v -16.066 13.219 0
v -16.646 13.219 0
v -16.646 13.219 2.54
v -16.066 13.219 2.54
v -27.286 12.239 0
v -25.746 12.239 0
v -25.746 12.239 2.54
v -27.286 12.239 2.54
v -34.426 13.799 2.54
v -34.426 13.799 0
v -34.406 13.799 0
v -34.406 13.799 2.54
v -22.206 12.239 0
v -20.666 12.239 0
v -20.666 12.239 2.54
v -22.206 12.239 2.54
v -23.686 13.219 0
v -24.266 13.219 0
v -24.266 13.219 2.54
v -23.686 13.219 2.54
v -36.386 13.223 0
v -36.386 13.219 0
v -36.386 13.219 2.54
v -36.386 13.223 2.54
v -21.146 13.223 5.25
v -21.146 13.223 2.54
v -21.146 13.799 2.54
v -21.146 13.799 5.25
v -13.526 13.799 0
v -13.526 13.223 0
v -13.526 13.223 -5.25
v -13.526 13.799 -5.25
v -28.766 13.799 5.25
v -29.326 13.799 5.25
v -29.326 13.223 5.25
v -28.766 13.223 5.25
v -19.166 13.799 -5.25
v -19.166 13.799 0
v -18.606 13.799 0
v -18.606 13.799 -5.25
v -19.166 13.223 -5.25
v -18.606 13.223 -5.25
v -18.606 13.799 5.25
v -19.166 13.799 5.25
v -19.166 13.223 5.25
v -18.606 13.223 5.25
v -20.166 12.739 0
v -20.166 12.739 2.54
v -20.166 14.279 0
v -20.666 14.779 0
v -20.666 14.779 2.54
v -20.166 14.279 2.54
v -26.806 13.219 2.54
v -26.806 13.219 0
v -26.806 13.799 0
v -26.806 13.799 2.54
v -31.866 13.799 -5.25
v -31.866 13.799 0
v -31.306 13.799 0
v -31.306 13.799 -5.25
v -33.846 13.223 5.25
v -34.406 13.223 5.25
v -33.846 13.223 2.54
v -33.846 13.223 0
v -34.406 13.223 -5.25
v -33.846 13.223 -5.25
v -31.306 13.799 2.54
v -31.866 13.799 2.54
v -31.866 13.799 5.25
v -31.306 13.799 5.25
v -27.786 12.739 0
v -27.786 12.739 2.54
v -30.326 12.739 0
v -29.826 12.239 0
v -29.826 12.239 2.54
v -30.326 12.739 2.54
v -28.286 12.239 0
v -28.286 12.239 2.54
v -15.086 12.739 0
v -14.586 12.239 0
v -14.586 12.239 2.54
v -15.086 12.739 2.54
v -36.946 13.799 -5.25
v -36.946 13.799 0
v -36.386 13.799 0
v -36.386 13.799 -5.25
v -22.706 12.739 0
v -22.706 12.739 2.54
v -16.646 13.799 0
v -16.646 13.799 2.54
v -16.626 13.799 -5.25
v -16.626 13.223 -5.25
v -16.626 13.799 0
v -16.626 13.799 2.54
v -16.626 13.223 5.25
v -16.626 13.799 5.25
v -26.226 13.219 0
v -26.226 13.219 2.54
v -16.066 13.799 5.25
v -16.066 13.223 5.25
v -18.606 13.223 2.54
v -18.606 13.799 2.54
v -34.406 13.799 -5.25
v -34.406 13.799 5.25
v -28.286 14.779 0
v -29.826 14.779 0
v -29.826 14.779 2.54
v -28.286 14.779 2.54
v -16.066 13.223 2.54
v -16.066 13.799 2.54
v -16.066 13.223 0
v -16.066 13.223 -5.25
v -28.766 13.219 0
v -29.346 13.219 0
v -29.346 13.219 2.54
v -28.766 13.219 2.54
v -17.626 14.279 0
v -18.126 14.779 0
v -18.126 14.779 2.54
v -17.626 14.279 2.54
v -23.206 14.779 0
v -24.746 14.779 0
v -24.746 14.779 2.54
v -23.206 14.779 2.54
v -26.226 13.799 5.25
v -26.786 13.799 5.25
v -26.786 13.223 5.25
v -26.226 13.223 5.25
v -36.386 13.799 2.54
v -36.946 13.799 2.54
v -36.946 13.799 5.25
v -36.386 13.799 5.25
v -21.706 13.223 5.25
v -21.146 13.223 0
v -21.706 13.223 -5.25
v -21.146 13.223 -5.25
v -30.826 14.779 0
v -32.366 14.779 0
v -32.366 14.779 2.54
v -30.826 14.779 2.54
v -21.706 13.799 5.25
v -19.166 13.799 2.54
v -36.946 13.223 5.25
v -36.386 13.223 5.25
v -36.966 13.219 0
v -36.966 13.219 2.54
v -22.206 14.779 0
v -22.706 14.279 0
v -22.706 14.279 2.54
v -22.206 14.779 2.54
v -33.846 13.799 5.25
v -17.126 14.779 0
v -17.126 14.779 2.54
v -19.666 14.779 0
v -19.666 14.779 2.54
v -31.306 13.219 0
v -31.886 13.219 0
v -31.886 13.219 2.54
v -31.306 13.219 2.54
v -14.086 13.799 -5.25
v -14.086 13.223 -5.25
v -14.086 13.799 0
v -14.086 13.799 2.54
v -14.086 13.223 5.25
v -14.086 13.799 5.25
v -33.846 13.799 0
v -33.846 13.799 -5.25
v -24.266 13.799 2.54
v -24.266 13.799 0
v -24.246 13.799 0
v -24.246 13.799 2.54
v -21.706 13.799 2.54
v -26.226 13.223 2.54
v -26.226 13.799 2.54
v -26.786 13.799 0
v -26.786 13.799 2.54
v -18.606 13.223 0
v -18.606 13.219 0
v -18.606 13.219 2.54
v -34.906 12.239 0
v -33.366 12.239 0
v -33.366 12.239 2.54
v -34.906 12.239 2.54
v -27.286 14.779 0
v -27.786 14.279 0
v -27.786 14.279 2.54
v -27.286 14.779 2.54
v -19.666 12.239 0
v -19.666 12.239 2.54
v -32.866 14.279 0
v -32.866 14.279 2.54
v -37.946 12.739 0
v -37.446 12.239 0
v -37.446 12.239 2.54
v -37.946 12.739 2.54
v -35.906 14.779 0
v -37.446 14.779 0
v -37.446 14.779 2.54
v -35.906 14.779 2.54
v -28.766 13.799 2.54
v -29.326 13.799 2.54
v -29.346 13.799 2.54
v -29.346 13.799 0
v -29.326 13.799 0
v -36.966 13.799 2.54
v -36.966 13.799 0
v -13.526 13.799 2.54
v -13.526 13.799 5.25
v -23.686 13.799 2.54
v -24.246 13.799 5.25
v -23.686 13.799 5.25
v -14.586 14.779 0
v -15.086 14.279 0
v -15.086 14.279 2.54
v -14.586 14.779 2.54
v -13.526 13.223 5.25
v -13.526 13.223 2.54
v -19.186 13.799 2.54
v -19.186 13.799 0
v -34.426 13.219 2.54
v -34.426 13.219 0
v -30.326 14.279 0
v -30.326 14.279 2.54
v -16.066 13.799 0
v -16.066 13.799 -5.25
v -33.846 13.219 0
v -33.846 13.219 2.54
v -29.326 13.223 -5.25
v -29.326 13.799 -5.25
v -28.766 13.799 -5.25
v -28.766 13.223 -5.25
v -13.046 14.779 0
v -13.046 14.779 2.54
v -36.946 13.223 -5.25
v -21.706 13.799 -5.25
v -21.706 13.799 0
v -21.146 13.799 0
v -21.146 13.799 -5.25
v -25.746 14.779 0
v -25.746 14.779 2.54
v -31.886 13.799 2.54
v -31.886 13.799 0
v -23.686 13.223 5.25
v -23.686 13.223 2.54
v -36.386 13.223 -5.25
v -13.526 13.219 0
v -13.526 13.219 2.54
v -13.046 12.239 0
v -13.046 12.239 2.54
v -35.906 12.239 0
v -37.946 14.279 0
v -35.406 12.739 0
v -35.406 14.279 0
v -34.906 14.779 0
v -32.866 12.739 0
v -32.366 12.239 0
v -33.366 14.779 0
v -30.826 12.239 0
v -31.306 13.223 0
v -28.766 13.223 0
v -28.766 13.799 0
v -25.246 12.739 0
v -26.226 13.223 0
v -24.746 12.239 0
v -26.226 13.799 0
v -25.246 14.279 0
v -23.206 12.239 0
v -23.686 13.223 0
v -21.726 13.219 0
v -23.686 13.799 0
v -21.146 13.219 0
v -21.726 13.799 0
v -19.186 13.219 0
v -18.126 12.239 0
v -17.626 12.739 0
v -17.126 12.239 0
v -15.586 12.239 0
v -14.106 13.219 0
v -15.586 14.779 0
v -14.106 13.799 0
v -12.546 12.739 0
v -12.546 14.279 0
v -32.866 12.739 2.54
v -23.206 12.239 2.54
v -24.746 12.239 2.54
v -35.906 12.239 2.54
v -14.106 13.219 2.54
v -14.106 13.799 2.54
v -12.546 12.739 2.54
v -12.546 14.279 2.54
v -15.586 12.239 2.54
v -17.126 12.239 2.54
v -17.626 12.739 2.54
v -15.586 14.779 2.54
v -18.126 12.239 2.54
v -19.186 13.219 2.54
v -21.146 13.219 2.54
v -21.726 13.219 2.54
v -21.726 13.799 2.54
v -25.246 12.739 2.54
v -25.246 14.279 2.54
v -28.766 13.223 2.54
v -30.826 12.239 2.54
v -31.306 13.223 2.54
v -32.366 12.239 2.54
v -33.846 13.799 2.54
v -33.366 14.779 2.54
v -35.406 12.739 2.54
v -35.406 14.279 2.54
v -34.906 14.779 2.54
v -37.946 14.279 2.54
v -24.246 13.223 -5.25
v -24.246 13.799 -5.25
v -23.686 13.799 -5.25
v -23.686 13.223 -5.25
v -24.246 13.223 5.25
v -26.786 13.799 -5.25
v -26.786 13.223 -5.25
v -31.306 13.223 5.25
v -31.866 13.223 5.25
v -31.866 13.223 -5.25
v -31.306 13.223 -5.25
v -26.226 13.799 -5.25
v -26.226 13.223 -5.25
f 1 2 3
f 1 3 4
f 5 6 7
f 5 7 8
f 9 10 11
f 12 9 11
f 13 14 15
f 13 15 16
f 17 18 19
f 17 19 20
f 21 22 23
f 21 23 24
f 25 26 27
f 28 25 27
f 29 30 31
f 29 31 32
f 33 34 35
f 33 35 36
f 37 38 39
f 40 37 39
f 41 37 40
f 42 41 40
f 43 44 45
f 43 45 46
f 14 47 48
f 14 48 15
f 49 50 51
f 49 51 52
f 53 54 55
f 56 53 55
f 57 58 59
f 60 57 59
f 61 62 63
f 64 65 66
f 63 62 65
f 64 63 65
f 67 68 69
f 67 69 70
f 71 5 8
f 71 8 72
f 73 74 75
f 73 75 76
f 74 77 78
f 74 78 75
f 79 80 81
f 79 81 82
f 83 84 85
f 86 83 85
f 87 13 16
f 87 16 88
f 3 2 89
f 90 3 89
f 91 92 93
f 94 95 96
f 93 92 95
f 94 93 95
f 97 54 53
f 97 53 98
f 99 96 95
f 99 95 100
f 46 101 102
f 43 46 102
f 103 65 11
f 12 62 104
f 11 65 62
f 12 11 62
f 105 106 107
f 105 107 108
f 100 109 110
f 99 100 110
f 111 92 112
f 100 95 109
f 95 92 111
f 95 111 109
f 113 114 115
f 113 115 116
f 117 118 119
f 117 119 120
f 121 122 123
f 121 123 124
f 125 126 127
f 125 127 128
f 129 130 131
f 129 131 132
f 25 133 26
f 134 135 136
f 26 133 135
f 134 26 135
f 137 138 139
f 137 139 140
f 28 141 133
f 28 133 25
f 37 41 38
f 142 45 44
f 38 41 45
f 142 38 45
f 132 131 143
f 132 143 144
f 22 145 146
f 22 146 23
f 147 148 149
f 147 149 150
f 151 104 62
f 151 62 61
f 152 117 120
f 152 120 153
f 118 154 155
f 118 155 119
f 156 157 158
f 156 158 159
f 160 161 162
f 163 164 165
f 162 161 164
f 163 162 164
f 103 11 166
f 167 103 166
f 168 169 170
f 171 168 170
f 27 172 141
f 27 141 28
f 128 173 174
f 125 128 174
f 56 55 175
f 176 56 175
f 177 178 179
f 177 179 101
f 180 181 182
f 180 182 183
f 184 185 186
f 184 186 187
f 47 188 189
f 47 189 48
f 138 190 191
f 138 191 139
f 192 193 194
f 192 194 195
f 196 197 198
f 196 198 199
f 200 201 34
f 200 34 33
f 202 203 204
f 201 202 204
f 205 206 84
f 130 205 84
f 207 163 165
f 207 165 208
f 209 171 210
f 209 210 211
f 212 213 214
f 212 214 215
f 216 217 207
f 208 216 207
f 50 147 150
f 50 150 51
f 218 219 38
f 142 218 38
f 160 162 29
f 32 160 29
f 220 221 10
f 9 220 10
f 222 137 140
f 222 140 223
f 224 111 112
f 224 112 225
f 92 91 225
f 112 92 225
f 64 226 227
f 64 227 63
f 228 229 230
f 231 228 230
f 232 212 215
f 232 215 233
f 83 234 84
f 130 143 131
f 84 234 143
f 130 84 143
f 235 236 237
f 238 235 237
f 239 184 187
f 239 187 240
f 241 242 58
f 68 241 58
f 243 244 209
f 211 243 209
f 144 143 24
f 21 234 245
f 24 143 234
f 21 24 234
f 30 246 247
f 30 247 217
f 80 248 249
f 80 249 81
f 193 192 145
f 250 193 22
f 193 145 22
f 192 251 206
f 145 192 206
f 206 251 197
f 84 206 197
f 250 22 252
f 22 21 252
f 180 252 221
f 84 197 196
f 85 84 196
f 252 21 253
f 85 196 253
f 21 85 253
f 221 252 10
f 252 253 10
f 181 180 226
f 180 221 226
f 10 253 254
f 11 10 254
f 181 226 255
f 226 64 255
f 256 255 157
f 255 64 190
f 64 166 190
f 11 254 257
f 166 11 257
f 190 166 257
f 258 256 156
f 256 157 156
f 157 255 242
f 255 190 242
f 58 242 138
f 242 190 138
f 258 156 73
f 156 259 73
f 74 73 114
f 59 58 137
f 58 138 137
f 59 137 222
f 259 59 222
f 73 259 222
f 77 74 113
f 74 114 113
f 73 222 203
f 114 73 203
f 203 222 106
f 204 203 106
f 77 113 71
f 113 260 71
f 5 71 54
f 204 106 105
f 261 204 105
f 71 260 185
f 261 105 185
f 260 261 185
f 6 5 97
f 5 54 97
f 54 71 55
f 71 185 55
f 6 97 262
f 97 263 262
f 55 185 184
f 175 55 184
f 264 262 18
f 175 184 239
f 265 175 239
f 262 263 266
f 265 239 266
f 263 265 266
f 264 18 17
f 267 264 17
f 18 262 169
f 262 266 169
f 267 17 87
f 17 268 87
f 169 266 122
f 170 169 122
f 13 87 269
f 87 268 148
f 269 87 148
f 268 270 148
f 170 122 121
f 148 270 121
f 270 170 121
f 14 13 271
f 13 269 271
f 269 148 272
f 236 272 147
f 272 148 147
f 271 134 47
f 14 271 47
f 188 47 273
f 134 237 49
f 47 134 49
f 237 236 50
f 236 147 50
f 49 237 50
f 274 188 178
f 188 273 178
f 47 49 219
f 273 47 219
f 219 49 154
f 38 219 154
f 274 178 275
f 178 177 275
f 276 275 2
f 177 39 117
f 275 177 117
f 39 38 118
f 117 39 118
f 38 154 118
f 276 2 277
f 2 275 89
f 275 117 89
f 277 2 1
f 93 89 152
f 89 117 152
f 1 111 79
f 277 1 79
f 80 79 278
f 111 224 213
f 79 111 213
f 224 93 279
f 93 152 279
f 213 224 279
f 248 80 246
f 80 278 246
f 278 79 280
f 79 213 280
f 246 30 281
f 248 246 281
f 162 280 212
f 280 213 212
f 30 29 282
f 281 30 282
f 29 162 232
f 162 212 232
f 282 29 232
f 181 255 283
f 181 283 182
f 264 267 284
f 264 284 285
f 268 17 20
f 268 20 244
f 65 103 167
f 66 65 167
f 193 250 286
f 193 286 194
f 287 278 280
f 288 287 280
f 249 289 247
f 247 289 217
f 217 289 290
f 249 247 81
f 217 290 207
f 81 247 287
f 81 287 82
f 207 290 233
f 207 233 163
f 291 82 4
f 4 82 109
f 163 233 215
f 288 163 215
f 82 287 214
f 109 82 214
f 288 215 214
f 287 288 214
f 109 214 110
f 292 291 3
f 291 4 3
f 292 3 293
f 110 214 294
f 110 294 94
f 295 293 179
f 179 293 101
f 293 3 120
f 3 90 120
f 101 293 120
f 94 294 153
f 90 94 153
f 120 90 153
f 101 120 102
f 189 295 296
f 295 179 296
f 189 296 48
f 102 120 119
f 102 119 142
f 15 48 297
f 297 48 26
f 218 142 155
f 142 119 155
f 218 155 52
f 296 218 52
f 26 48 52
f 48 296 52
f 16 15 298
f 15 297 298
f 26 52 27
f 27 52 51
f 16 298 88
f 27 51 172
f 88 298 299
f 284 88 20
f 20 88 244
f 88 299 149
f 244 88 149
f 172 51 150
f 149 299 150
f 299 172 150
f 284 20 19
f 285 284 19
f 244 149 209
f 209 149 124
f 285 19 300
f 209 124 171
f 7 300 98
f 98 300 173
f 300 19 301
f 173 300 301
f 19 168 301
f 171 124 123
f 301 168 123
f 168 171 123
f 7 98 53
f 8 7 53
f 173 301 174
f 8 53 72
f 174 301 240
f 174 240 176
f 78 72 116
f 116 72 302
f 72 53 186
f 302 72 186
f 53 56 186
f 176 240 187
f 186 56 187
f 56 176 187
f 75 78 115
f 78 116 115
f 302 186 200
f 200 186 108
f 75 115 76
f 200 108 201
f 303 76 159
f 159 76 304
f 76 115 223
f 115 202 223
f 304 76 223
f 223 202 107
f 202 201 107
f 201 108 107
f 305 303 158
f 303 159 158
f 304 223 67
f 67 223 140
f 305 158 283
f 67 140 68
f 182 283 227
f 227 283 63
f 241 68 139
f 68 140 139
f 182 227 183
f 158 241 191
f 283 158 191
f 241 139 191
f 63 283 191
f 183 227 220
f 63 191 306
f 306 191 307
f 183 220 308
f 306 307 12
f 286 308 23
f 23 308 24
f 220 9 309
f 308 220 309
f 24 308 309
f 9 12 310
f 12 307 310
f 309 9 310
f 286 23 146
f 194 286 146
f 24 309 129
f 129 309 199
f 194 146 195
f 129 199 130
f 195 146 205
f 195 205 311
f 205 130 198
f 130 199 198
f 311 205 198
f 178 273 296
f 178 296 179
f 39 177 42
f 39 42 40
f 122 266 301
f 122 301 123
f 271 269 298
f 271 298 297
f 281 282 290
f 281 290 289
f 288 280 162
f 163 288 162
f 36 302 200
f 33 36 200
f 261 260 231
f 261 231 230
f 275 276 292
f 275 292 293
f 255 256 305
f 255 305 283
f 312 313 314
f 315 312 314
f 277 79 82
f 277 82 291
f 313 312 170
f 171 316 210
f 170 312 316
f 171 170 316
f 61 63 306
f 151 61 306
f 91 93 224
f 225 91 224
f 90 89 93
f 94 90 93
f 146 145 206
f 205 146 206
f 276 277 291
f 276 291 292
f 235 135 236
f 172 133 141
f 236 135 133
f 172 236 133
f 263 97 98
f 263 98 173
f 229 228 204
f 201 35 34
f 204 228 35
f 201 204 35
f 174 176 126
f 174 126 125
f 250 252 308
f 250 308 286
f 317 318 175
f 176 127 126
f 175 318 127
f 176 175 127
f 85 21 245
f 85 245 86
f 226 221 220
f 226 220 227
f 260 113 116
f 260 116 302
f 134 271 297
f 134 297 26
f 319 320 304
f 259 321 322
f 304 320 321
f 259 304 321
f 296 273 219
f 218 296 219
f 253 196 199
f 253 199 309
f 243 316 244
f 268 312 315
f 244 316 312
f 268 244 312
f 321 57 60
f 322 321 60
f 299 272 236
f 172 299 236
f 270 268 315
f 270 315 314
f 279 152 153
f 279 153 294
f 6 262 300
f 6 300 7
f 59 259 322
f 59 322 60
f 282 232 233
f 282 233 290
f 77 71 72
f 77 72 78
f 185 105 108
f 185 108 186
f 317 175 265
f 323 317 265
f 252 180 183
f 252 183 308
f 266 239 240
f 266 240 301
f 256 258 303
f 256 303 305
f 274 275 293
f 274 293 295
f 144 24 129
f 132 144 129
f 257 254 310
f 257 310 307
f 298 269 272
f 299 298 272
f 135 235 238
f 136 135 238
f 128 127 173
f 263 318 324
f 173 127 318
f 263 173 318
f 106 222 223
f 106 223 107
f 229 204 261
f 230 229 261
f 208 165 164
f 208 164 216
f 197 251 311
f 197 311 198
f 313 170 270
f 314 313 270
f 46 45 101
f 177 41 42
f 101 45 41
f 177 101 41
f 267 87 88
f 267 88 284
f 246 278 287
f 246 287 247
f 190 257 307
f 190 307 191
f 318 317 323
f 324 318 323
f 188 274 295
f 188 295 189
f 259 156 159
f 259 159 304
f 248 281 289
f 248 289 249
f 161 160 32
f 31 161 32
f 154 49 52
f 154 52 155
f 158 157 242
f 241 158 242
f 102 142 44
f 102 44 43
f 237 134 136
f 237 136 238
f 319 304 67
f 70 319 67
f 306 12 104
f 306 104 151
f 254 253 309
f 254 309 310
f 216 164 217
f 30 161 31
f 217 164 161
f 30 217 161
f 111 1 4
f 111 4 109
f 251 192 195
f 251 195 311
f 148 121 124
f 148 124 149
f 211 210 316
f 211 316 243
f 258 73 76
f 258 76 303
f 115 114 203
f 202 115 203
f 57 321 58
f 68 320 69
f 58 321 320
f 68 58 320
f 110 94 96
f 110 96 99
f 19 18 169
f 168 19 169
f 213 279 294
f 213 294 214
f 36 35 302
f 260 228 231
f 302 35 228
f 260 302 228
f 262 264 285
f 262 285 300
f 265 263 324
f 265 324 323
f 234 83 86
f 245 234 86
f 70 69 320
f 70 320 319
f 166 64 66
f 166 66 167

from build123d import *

# Parameters (mm, degrees)
SKETCH1_W                = 0.58
SKETCH1_H                = 0.58
BOSS_EXTRUDE1_DEPTH      = 2.54
BOSS_EXTRUDE2_DEPTH      = 5.25
BOSS_EXTRUDE2_DEPTH_BACK = 5.25
SKETCH2_W                = 0.5591264
SKETCH2_H                = 0.575944702


with BuildPart() as part:
    # Sketch1 → Boss-Extrude1 (new body)
    with BuildSketch(Plane.XY):
        Polygon((-37.946397324, 14.279123168), (-37.446397324, 14.779123168), (-35.906397324, 14.779123168), (-35.406397324, 14.279123168), (-34.906397324, 14.779123168), (-33.366397324, 14.779123168), (-32.866397324, 14.279123168), (-32.366397324, 14.779123168), (-30.826397324, 14.779123168), (-30.326397324, 14.279123168), (-29.826397324, 14.779123168), (-28.286397324, 14.779123168), (-27.786397324, 14.279123168), (-27.286397324, 14.779123168), (-25.746397324, 14.779123168), (-25.246397324, 14.279123168), (-24.746397324, 14.779123168), (-23.206397324, 14.779123168), (-22.706397324, 14.279123168), (-22.206397324, 14.779123168), (-20.666397324, 14.779123168), (-20.166397324, 14.279123168), (-19.666397324, 14.779123168), (-18.126397324, 14.779123168), (-17.626397324, 14.279123168), (-17.126397324, 14.779123168), (-15.586397324, 14.779123168), (-15.086397324, 14.279123168), (-14.586397324, 14.779123168), (-13.046397324, 14.779123168), (-12.546397324, 14.279123168), (-12.546397324, 12.739123168), (-13.046397324, 12.239123168), (-14.586397324, 12.239123168), (-15.086397324, 12.739123168), (-15.586397324, 12.239123168), (-17.126397324, 12.239123168), (-17.626397324, 12.739123168), (-18.126397324, 12.239123168), (-19.666397324, 12.239123168), (-20.166397324, 12.739123168), (-20.666397324, 12.239123168), (-22.206397324, 12.239123168), (-22.706397324, 12.739123168), (-23.206397324, 12.239123168), (-24.746397324, 12.239123168), (-25.246397324, 12.739123168), (-25.746397324, 12.239123168), (-27.286397324, 12.239123168), (-27.786397324, 12.739123168), (-28.286397324, 12.239123168), (-29.826397324, 12.239123168), (-30.326397324, 12.739123168), (-30.826397324, 12.239123168), (-32.366397324, 12.239123168), (-32.866397324, 12.739123168), (-33.366397324, 12.239123168), (-34.906397324, 12.239123168), (-35.406397324, 12.739123168), (-35.906397324, 12.239123168), (-37.446397324, 12.239123168), (-37.946397324, 12.739123168), align=None)
        with Locations((-16.356397324, 13.509123168)):
            Rectangle(SKETCH1_W, SKETCH1_H, mode=Mode.SUBTRACT)
        with Locations((-13.816397324, 13.509123168)):
            Rectangle(SKETCH1_W, SKETCH1_H, mode=Mode.SUBTRACT)
        with Locations((-18.896397324, 13.509123168)):
            Rectangle(SKETCH1_W, SKETCH1_H, mode=Mode.SUBTRACT)
        with Locations((-21.436397324, 13.509123168)):
            Rectangle(SKETCH1_W, SKETCH1_H, mode=Mode.SUBTRACT)
        with Locations((-23.976397324, 13.509123168)):
            Rectangle(SKETCH1_W, SKETCH1_H, mode=Mode.SUBTRACT)
        with Locations((-26.516397324, 13.509123168)):
            Rectangle(SKETCH1_W, SKETCH1_H, mode=Mode.SUBTRACT)
        with Locations((-29.056397324, 13.509123168)):
            Rectangle(SKETCH1_W, SKETCH1_H, mode=Mode.SUBTRACT)
        with Locations((-31.596397324, 13.509123168)):
            Rectangle(SKETCH1_W, SKETCH1_H, mode=Mode.SUBTRACT)
        with Locations((-34.136397324, 13.509123168)):
            Rectangle(SKETCH1_W, SKETCH1_H, mode=Mode.SUBTRACT)
        with Locations((-36.676397324, 13.509123168)):
            Rectangle(SKETCH1_W, SKETCH1_H, mode=Mode.SUBTRACT)
    extrude(amount=BOSS_EXTRUDE1_DEPTH)

    # Sketch2 → Boss-Extrude2 (add, two sides: drawn at the far end of the back side and taken through both)
    with BuildSketch(Plane.XY.offset(-BOSS_EXTRUDE2_DEPTH_BACK)):
        with Locations((-16.345960524, 13.511150817)):
            Rectangle(SKETCH2_W, SKETCH2_H)
        with Locations((-13.805960524, 13.511150817)):
            Rectangle(SKETCH2_W, SKETCH2_H)
        with Locations((-18.885960524, 13.511150817)):
            Rectangle(SKETCH2_W, SKETCH2_H)
        with Locations((-21.425960524, 13.511150817)):
            Rectangle(SKETCH2_W, SKETCH2_H)
        with Locations((-23.965960524, 13.511150817)):
            Rectangle(SKETCH2_W, SKETCH2_H)
        with Locations((-26.505960524, 13.511150817)):
            Rectangle(SKETCH2_W, SKETCH2_H)
        with Locations((-29.045960524, 13.511150817)):
            Rectangle(SKETCH2_W, SKETCH2_H)
        with Locations((-31.585960524, 13.511150817)):
            Rectangle(SKETCH2_W, SKETCH2_H)
        with Locations((-34.125960524, 13.511150817)):
            Rectangle(SKETCH2_W, SKETCH2_H)
        with Locations((-36.665960524, 13.511150817)):
            Rectangle(SKETCH2_W, SKETCH2_H)
    extrude(amount=BOSS_EXTRUDE2_DEPTH + BOSS_EXTRUDE2_DEPTH_BACK)


solid = part.part
